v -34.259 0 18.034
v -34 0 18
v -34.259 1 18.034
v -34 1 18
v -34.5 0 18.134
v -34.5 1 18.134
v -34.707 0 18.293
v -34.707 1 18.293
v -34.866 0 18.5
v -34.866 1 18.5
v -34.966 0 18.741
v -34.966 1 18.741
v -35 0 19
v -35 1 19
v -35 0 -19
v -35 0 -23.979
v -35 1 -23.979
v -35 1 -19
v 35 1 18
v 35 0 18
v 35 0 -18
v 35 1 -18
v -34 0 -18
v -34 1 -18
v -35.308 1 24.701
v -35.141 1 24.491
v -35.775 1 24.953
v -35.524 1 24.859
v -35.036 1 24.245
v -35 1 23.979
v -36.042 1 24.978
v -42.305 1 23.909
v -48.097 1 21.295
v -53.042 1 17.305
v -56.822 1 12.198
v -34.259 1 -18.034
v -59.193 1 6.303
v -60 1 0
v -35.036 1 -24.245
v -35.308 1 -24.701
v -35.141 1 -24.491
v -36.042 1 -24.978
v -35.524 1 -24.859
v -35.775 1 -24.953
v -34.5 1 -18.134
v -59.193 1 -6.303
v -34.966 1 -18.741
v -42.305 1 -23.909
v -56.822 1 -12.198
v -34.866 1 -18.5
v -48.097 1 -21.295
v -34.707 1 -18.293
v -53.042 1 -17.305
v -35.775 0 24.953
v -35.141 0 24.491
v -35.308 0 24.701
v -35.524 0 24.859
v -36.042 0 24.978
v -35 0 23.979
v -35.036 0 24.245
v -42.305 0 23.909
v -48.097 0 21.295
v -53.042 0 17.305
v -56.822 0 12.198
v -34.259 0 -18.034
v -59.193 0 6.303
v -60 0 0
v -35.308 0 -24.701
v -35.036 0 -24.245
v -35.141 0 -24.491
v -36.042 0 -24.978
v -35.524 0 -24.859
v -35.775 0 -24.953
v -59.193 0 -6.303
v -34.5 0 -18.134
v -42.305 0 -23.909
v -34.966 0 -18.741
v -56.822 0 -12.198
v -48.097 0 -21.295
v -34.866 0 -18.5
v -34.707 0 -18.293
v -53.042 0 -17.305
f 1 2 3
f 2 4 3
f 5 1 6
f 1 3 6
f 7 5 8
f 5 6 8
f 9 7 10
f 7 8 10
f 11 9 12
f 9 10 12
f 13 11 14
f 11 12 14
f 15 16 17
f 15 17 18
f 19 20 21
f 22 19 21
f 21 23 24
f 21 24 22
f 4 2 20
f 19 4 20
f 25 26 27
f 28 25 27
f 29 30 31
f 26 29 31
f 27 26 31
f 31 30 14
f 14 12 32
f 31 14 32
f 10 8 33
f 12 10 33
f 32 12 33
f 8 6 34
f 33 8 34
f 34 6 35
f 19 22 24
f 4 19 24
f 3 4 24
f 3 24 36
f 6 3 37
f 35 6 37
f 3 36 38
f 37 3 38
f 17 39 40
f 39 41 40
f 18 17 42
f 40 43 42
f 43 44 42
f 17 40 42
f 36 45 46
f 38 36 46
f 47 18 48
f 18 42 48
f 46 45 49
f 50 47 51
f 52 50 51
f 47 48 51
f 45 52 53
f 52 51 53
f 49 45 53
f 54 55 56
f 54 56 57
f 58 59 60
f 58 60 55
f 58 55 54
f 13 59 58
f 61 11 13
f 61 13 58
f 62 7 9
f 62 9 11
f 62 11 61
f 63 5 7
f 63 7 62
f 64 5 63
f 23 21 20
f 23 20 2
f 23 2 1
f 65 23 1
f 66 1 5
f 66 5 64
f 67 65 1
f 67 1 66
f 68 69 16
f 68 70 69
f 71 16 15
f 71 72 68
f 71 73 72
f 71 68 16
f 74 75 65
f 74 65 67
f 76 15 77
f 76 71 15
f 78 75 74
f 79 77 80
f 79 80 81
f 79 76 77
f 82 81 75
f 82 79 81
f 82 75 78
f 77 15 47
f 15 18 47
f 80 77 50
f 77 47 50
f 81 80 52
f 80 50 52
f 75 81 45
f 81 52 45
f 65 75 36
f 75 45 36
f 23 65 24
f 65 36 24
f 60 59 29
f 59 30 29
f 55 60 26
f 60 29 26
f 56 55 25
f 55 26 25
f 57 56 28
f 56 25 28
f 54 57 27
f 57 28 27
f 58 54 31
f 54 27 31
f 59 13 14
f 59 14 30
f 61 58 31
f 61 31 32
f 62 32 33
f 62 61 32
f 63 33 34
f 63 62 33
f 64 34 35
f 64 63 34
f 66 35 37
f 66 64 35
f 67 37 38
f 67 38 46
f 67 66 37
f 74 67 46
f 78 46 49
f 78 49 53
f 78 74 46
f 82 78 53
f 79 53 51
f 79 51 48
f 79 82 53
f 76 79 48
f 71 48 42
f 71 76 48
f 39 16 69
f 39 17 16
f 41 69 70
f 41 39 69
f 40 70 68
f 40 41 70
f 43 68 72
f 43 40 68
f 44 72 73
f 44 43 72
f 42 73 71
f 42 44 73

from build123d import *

# Parameters (mm, degrees)
SKETCH1_W           = 70
SKETCH1_H           = 36
BOSS_EXTRUDE1_DEPTH = 1
FILLET1_R           = 1


with BuildPart() as part:
    # Sketch1 → Boss-Extrude1 (new body)
    with BuildSketch(Plane(origin=(0, 0, 0), x_dir=(1, 0, 0), z_dir=(0, 1, 0))):
        with BuildLine():
            Line((-35, 25), (-35, 18))
            Line((-35, 18), (-35, -18))
            Line((-35, -18), (-35, -25))
            ThreePointArc((-35, -25), (-60, 0), (-35, 25))
        make_face()
        Rectangle(SKETCH1_W, SKETCH1_H)
    extrude(amount=BOSS_EXTRUDE1_DEPTH)

    # Fillet1
    fillet1_edges = [part.edges().sort_by_distance(p)[0] for p in [
        (-35, 0.5, -18),
        (-35, 0.5, 18),
        (-35, 0.5, 25),
        (-35, 0.5, -25),
    ]]
    fillet(fillet1_edges, radius=FILLET1_R)


solid = part.part
